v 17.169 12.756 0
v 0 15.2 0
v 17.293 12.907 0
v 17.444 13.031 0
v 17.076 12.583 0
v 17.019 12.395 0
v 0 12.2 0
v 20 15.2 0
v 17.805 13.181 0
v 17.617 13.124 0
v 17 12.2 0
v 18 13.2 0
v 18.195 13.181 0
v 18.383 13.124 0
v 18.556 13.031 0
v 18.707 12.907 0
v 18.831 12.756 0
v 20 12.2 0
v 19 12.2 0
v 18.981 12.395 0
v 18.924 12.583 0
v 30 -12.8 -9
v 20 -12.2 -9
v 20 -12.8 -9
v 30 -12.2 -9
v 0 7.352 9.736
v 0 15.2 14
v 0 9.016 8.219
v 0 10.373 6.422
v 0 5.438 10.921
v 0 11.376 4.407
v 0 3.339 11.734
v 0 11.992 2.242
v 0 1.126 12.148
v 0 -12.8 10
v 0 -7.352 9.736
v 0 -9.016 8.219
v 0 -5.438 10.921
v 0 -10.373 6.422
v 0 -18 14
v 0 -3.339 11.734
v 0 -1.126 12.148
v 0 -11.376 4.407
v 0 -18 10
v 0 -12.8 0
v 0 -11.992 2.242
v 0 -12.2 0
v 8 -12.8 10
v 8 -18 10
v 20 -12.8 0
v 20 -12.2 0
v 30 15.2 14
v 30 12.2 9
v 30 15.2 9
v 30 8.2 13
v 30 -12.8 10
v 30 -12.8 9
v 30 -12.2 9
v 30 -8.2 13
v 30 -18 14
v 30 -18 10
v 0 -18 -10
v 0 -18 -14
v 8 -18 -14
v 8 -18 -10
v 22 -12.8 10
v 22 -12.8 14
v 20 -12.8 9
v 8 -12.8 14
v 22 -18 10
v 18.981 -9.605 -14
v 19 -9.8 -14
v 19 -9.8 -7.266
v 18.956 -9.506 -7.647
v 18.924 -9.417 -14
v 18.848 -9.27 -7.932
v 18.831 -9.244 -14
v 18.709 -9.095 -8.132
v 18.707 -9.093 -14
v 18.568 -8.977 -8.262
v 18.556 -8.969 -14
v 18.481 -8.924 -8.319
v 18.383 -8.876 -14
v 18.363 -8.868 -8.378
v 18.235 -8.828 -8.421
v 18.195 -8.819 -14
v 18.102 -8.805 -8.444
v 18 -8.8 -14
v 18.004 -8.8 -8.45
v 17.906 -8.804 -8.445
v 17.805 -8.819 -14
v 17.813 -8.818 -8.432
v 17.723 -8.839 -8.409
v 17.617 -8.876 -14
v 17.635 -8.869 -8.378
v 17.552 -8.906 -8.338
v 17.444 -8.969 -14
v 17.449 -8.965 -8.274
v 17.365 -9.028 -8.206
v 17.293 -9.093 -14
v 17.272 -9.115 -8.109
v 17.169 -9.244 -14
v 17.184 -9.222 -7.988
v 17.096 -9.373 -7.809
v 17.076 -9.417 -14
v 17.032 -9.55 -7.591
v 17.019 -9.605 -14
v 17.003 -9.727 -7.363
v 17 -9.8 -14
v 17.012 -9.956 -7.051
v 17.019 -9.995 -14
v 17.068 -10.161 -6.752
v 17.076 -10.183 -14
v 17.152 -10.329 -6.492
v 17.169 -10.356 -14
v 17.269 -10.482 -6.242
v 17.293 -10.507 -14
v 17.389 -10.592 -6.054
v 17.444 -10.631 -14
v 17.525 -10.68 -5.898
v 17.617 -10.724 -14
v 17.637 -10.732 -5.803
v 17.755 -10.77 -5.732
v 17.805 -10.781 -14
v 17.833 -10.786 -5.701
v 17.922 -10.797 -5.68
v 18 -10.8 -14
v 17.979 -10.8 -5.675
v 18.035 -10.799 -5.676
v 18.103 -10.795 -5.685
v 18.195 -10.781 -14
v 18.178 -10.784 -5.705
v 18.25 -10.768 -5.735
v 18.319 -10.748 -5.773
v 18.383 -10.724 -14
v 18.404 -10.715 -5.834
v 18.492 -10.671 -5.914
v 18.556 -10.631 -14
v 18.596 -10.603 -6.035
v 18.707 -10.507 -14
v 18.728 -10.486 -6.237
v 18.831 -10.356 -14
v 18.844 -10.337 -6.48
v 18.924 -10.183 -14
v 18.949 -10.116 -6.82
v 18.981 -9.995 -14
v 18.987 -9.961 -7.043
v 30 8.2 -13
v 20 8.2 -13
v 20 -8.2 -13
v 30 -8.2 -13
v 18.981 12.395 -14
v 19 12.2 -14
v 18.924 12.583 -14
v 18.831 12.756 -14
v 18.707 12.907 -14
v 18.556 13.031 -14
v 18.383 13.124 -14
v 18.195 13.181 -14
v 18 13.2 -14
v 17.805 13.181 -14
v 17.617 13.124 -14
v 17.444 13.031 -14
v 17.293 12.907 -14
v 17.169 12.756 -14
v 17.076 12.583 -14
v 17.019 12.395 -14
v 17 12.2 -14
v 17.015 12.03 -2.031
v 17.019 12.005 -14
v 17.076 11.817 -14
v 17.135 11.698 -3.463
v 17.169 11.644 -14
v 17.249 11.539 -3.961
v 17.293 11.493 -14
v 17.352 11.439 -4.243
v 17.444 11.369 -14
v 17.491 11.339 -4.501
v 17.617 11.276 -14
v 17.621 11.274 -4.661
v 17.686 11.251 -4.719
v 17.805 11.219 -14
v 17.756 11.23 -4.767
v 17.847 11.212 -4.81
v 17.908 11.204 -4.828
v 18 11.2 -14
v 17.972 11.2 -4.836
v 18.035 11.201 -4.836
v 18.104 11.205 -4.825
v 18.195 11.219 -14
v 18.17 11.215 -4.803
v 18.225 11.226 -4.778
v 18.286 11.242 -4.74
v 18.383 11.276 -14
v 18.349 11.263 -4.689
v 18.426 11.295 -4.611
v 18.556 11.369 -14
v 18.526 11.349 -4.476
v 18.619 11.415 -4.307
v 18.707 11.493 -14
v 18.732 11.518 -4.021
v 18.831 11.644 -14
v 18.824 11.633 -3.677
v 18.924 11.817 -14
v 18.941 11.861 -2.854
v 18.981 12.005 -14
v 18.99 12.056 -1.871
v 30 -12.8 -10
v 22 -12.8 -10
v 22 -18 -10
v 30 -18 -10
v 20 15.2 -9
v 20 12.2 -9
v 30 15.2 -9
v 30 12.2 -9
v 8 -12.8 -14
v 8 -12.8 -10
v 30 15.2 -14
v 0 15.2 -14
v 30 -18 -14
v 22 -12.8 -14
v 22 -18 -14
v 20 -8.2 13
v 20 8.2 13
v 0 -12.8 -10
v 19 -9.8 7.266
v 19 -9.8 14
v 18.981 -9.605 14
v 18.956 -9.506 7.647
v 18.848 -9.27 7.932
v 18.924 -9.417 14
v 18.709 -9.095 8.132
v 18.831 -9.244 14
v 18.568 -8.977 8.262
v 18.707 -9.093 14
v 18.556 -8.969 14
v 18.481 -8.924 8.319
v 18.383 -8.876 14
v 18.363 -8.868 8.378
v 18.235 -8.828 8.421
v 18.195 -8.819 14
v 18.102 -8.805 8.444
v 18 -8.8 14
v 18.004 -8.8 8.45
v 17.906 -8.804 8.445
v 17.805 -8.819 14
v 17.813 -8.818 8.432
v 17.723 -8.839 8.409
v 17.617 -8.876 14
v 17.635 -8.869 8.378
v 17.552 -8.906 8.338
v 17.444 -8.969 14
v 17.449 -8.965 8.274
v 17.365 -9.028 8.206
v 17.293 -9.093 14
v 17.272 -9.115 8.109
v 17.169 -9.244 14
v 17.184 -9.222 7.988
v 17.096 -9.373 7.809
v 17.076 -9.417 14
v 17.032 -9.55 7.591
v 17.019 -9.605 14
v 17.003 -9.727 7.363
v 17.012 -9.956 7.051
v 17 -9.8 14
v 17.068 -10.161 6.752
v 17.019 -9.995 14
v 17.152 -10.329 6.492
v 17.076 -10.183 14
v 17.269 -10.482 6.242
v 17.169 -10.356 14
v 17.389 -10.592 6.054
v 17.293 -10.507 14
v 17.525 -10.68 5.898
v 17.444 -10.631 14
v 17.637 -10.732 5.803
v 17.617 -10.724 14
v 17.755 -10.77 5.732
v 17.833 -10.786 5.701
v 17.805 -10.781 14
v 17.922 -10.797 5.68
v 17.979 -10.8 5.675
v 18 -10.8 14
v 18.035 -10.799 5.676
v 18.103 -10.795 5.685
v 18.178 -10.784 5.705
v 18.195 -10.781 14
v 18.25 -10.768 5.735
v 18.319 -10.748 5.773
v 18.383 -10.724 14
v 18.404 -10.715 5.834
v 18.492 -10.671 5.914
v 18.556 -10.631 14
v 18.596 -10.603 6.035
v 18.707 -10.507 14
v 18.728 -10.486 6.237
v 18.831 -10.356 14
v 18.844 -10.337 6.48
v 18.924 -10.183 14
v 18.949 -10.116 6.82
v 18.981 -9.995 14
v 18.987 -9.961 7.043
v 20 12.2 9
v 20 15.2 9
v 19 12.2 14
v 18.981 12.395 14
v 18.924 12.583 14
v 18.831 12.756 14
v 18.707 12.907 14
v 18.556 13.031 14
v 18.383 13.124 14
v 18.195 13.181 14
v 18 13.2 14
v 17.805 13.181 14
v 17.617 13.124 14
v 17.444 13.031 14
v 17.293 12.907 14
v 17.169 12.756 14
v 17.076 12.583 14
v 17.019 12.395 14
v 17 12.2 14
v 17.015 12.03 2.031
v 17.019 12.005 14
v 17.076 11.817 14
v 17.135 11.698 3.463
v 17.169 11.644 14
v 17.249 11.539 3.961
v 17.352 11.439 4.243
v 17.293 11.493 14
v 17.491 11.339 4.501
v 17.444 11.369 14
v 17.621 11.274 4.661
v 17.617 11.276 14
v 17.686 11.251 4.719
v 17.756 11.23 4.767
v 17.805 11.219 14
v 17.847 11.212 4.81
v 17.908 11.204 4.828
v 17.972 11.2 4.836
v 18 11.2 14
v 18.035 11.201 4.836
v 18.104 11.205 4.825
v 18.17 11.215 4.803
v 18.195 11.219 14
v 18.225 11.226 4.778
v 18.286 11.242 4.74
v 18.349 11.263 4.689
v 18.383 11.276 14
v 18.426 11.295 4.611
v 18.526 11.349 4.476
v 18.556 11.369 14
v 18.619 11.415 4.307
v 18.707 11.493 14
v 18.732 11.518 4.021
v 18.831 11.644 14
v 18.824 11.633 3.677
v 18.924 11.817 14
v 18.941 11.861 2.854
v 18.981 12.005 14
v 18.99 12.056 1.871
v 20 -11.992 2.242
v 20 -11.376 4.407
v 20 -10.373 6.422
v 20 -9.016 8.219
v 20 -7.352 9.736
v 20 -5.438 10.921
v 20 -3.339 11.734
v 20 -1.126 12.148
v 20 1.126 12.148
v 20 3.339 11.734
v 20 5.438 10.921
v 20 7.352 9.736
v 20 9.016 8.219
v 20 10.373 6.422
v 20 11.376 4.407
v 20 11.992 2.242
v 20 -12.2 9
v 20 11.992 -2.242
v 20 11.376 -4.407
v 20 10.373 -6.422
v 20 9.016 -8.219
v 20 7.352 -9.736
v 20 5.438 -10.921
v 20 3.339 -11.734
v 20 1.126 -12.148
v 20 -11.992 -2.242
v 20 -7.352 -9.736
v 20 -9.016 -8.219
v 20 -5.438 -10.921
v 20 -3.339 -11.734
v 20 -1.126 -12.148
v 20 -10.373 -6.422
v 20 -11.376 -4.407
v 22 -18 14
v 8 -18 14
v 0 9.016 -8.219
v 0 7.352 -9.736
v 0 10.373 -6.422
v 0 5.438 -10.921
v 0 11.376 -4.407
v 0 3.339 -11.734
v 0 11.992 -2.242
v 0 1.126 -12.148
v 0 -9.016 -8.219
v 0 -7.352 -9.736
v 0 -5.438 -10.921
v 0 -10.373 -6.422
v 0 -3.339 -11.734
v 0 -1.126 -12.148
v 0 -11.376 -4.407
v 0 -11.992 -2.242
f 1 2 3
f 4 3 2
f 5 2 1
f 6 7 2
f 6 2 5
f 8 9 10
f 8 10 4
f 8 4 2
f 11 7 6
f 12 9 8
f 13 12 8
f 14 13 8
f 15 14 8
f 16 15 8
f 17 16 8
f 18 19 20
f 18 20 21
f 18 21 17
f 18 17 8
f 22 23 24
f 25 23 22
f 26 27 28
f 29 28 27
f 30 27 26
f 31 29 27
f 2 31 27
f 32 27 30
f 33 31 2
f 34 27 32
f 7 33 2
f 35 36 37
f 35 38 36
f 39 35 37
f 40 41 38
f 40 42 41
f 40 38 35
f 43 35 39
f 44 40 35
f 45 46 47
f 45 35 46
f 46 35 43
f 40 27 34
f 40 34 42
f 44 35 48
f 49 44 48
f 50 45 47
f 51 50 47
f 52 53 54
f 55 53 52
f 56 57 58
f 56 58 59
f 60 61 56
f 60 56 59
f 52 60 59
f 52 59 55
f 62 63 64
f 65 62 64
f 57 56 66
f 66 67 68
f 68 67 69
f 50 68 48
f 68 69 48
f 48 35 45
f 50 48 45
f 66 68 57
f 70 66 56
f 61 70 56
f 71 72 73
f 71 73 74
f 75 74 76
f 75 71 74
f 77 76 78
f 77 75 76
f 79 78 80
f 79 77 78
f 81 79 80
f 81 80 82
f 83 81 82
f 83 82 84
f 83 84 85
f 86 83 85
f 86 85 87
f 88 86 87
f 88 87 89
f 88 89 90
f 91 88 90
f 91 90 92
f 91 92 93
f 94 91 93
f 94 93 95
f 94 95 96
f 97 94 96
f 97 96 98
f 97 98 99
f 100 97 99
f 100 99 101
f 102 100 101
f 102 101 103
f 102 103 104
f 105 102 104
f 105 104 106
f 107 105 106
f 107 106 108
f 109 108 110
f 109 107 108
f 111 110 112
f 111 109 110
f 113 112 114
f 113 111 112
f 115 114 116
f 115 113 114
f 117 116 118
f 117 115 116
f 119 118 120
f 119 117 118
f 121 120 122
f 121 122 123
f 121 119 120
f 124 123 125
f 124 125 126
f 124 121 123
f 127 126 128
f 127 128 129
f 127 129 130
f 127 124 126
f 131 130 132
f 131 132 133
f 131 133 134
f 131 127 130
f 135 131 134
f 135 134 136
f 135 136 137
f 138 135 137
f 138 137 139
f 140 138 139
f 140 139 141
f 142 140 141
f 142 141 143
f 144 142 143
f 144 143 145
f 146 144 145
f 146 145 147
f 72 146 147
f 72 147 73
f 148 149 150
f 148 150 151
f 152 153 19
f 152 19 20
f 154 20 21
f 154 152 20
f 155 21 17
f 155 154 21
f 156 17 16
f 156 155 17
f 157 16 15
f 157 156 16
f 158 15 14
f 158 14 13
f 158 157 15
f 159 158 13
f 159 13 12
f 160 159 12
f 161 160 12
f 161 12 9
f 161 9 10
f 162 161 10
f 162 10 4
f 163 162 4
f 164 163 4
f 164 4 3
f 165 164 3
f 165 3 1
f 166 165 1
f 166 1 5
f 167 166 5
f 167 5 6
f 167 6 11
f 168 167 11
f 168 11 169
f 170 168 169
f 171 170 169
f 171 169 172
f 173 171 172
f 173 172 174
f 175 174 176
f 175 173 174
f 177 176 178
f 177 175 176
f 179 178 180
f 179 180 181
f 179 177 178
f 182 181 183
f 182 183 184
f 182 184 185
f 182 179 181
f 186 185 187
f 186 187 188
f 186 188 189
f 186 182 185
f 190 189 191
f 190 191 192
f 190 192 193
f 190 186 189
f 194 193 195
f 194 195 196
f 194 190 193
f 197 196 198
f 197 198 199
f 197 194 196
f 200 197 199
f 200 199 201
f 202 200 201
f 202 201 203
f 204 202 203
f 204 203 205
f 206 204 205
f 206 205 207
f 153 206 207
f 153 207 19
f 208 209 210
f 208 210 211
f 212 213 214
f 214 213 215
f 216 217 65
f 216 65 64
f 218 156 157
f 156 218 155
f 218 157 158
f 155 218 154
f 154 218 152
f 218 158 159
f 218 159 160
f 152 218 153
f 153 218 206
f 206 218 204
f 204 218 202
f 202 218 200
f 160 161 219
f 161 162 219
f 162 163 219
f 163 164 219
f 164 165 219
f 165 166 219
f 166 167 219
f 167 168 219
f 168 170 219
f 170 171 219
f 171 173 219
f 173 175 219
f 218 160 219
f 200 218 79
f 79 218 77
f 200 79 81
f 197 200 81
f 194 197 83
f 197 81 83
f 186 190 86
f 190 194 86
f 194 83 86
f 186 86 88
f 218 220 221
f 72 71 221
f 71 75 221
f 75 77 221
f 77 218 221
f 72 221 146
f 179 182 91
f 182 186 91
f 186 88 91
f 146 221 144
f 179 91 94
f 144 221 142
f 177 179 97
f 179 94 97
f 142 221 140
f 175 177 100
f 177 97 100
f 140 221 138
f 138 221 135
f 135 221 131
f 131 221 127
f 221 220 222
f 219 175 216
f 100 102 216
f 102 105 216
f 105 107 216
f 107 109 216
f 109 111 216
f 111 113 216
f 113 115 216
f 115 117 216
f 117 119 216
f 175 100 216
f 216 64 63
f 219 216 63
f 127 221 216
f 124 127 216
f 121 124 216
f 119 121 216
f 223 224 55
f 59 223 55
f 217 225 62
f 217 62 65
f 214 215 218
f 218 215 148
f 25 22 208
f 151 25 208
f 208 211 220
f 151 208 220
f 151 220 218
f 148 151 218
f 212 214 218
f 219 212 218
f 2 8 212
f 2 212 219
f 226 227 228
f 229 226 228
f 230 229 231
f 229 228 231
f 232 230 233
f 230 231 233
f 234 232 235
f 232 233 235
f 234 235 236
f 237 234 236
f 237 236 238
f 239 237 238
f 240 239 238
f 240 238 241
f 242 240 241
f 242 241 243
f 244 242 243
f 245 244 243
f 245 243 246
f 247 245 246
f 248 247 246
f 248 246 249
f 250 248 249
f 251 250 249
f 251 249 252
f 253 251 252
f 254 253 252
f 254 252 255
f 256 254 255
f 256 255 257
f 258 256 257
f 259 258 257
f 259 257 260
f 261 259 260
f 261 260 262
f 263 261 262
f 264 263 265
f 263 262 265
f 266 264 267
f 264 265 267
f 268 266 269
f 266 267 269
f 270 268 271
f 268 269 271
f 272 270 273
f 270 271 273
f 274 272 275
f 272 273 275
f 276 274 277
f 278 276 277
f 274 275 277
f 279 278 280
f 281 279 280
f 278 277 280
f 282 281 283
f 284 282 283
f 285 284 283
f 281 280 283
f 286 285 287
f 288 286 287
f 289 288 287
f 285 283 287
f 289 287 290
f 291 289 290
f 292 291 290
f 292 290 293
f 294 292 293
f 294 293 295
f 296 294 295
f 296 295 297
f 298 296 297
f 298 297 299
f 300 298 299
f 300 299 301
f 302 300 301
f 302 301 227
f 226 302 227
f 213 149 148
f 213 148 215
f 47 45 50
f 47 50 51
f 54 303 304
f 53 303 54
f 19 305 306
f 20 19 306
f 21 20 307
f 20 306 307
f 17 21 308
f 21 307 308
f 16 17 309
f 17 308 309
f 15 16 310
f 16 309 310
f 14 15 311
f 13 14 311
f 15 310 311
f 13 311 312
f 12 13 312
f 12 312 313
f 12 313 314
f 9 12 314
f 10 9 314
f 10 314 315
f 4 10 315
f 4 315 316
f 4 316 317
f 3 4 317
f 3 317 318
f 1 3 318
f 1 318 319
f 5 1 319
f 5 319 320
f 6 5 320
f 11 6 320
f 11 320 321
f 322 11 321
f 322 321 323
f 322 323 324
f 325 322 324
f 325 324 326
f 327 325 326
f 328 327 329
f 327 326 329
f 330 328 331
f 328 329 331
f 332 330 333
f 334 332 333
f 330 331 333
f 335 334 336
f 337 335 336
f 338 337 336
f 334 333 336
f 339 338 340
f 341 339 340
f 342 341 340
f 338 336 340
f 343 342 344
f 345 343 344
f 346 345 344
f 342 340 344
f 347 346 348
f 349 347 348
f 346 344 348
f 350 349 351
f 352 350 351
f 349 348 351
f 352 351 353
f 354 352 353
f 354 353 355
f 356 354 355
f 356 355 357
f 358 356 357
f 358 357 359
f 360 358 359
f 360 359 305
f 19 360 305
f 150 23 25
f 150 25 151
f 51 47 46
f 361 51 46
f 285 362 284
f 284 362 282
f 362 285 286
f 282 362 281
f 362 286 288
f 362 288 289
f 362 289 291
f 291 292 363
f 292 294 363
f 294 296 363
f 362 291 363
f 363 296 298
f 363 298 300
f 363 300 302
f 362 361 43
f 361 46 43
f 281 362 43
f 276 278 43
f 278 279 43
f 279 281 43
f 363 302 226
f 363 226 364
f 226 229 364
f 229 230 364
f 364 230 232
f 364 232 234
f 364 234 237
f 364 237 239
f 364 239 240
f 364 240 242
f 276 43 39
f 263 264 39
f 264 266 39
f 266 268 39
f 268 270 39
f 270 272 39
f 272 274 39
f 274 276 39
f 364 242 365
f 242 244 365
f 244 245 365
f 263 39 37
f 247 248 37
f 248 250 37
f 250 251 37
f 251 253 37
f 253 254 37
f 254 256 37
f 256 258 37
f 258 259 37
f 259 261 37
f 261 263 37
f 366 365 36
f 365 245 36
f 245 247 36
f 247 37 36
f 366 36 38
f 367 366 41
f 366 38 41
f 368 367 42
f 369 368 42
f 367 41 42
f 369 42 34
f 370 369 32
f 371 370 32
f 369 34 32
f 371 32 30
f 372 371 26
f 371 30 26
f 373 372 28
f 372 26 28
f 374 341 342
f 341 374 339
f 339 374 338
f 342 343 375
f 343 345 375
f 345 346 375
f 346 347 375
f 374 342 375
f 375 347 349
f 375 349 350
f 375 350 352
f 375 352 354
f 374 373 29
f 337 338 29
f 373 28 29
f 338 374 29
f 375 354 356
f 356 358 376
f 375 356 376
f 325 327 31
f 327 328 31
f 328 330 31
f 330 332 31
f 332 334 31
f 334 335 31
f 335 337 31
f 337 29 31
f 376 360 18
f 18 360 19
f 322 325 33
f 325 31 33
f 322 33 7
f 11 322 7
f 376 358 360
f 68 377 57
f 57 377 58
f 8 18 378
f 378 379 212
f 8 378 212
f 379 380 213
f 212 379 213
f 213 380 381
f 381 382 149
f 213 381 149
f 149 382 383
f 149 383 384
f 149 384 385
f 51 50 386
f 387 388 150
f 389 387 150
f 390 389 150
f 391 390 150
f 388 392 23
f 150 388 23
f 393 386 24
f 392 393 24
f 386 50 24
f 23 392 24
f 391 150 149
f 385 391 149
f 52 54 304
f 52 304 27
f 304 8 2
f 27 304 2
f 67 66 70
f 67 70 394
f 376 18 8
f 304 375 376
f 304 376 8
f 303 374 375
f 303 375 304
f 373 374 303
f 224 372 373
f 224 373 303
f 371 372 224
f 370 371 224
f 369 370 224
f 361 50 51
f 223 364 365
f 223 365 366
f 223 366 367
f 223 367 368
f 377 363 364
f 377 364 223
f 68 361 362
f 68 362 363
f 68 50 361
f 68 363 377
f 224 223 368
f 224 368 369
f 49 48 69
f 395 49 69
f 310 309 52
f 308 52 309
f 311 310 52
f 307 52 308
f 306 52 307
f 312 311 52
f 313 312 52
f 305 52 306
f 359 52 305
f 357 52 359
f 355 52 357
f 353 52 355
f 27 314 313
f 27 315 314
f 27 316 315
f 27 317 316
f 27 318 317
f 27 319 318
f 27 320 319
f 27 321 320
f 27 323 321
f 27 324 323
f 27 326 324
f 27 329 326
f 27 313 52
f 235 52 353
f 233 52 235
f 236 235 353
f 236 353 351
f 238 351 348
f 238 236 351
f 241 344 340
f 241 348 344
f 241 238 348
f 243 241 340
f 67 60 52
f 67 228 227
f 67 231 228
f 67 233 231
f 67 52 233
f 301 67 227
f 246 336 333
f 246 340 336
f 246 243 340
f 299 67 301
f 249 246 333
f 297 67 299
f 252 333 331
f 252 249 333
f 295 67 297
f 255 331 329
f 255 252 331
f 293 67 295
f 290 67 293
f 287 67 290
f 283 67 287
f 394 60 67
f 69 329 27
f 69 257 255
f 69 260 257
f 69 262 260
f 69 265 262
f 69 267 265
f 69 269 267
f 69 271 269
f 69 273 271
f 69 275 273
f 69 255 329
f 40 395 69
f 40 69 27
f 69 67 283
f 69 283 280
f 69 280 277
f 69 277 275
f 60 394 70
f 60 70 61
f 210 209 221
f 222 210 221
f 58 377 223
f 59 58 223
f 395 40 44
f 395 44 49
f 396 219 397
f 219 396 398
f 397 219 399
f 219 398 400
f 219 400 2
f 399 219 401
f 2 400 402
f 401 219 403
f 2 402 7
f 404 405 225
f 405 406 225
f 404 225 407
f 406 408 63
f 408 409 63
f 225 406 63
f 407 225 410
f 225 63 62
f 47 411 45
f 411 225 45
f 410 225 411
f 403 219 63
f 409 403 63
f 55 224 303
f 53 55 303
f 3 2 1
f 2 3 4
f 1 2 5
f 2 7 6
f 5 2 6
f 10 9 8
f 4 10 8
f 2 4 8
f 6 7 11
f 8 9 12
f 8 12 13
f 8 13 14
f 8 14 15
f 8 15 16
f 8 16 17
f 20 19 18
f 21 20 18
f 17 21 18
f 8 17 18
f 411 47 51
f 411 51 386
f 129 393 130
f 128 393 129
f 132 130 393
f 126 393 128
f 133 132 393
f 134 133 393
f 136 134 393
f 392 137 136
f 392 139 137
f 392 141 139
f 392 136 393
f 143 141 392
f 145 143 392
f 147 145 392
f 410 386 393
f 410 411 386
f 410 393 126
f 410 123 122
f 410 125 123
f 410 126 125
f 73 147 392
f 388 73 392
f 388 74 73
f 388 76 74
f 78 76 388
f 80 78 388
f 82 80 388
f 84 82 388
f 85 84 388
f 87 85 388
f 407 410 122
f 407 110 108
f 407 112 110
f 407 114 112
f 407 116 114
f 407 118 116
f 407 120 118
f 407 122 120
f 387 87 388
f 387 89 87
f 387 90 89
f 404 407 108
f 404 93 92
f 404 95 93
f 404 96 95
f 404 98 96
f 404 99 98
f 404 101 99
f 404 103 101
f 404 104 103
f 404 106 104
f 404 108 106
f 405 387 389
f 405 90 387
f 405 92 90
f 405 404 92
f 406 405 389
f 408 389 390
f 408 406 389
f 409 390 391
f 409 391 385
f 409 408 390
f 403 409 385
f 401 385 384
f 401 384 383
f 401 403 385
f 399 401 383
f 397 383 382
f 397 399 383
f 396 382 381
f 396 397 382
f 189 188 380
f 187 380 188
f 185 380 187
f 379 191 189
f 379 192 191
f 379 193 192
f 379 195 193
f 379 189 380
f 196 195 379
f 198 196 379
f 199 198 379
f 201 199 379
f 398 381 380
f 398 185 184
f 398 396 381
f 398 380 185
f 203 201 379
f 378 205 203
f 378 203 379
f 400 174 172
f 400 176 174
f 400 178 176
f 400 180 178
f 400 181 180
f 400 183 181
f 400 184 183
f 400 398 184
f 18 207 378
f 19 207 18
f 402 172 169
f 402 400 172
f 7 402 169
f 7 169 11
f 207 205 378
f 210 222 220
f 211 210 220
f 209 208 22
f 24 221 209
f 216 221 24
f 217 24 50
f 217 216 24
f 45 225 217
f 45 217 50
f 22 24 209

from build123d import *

# Parameters (mm, degrees)
EXTRUDE_1_DEPTH     = 20
SKETCH_2_W          = 1
SKETCH_2_H          = 24.4
EXTRUDE_2_DEPTH     = 10
EXTRUDE_4_DEPTH     = 0.6
EXTRUDE_5_DEPTH     = 10
SKETCH_8_W          = 8
SKETCH_8_H          = 4
EXTRUDE_6_DEPTH     = 5.2
EXTRUDE_7_DEPTH     = 3
SKETCH_3_R          = 1
CUT_EXTRUDE_1_DEPTH = 38.682887363
SKETCH_10_W         = 10
SKETCH_10_H         = 9
CUT_EXTRUDE_2_DEPTH = 3


with BuildPart() as part:
    # 草图1 → 凸台-拉伸1 (new body)
    with BuildSketch(Plane(origin=(0, 0, 0), x_dir=(0, 0, -1), z_dir=(1, 0, 0))):
        with BuildLine():
            Line((0, 12.2), (-14, 12.2))
            Line((-14, 12.2), (-14, -12.2))
            Line((-14, -12.2), (0, -12.2))
            ThreePointArc((0, -12.2), (-12.2, 0), (0, 12.2))
        make_face()
    extrude(amount=EXTRUDE_1_DEPTH)

    # 草图2 → 凸台-拉伸2 (add)
    with BuildSketch(Plane(origin=(20, 0, 0), x_dir=(0, 0, -1), z_dir=(1, 0, 0))):
        with Locations((-13.5, 0)):
            Rectangle(SKETCH_2_W, SKETCH_2_H)
    extrude(amount=EXTRUDE_2_DEPTH)

    # 草图6 → 凸台-拉伸4 (add)
    with BuildSketch(Plane.XZ.offset(12.2)):
        Polygon((0, 14), (0, 0), (20, 0), (20, 13), (30, 13), (30, 14), align=None)
    extrude(amount=EXTRUDE_4_DEPTH)

    # 草图7 → 凸台-拉伸5 (add)
    with BuildSketch(Plane(origin=(20, 0, 0), x_dir=(0, 0, -1), z_dir=(1, 0, 0))):
        Polygon((0, -12.2), (-9, -12.2), (-13, -8.2), (-13, -12.8), (0, -12.8), align=None)
        Polygon((-13, 8.2), (-9, 12.2), (-13, 12.2), align=None)
    extrude(amount=EXTRUDE_5_DEPTH)

    # 草图8 → 凸台-拉伸6 (add)
    with BuildSketch(Plane.XZ.offset(12.8)):
        with Locations((4, 12)):
            Rectangle(SKETCH_8_W, SKETCH_8_H)
        with Locations((26, 12)):
            Rectangle(SKETCH_8_W, SKETCH_8_H)
    extrude(amount=EXTRUDE_6_DEPTH)

    # 草图9 → 凸台-拉伸7 (add)
    with BuildSketch(Plane(origin=(0, 12.2, 0), x_dir=(1, 0, 0), z_dir=(0, 1, 0))):
        Polygon((0, 0), (20, 0), (20, -9), (30, -9), (30, -14), (0, -14), align=None)
    extrude(amount=EXTRUDE_7_DEPTH)

    # 草图3 → 切除-拉伸1 (cut, through all)
    with BuildSketch(Plane.XY.offset(14)):
        with Locations((18, 12.2)):
            Circle(SKETCH_3_R)
        with Locations((18, -9.8)):
            Circle(SKETCH_3_R)
    extrude(amount=-CUT_EXTRUDE_1_DEPTH, mode=Mode.SUBTRACT)

    # 草图10 → 切除-拉伸2 (cut)
    with BuildSketch(Plane(origin=(0, -12.2, 0), x_dir=(1, 0, 0), z_dir=(0, 1, 0))):
        with Locations((25, -4.5)):
            Rectangle(SKETCH_10_W, SKETCH_10_H)
    extrude(amount=-CUT_EXTRUDE_2_DEPTH, mode=Mode.SUBTRACT)


with BuildPart() as body_2:
    # 镜向4: mirrored copy
    add(part.part.mirror(Plane(origin=(0, 15.2, 0), x_dir=(1, 0, 0), z_dir=(0, 0, 1))))


solid = Compound([part.part, body_2.part])
